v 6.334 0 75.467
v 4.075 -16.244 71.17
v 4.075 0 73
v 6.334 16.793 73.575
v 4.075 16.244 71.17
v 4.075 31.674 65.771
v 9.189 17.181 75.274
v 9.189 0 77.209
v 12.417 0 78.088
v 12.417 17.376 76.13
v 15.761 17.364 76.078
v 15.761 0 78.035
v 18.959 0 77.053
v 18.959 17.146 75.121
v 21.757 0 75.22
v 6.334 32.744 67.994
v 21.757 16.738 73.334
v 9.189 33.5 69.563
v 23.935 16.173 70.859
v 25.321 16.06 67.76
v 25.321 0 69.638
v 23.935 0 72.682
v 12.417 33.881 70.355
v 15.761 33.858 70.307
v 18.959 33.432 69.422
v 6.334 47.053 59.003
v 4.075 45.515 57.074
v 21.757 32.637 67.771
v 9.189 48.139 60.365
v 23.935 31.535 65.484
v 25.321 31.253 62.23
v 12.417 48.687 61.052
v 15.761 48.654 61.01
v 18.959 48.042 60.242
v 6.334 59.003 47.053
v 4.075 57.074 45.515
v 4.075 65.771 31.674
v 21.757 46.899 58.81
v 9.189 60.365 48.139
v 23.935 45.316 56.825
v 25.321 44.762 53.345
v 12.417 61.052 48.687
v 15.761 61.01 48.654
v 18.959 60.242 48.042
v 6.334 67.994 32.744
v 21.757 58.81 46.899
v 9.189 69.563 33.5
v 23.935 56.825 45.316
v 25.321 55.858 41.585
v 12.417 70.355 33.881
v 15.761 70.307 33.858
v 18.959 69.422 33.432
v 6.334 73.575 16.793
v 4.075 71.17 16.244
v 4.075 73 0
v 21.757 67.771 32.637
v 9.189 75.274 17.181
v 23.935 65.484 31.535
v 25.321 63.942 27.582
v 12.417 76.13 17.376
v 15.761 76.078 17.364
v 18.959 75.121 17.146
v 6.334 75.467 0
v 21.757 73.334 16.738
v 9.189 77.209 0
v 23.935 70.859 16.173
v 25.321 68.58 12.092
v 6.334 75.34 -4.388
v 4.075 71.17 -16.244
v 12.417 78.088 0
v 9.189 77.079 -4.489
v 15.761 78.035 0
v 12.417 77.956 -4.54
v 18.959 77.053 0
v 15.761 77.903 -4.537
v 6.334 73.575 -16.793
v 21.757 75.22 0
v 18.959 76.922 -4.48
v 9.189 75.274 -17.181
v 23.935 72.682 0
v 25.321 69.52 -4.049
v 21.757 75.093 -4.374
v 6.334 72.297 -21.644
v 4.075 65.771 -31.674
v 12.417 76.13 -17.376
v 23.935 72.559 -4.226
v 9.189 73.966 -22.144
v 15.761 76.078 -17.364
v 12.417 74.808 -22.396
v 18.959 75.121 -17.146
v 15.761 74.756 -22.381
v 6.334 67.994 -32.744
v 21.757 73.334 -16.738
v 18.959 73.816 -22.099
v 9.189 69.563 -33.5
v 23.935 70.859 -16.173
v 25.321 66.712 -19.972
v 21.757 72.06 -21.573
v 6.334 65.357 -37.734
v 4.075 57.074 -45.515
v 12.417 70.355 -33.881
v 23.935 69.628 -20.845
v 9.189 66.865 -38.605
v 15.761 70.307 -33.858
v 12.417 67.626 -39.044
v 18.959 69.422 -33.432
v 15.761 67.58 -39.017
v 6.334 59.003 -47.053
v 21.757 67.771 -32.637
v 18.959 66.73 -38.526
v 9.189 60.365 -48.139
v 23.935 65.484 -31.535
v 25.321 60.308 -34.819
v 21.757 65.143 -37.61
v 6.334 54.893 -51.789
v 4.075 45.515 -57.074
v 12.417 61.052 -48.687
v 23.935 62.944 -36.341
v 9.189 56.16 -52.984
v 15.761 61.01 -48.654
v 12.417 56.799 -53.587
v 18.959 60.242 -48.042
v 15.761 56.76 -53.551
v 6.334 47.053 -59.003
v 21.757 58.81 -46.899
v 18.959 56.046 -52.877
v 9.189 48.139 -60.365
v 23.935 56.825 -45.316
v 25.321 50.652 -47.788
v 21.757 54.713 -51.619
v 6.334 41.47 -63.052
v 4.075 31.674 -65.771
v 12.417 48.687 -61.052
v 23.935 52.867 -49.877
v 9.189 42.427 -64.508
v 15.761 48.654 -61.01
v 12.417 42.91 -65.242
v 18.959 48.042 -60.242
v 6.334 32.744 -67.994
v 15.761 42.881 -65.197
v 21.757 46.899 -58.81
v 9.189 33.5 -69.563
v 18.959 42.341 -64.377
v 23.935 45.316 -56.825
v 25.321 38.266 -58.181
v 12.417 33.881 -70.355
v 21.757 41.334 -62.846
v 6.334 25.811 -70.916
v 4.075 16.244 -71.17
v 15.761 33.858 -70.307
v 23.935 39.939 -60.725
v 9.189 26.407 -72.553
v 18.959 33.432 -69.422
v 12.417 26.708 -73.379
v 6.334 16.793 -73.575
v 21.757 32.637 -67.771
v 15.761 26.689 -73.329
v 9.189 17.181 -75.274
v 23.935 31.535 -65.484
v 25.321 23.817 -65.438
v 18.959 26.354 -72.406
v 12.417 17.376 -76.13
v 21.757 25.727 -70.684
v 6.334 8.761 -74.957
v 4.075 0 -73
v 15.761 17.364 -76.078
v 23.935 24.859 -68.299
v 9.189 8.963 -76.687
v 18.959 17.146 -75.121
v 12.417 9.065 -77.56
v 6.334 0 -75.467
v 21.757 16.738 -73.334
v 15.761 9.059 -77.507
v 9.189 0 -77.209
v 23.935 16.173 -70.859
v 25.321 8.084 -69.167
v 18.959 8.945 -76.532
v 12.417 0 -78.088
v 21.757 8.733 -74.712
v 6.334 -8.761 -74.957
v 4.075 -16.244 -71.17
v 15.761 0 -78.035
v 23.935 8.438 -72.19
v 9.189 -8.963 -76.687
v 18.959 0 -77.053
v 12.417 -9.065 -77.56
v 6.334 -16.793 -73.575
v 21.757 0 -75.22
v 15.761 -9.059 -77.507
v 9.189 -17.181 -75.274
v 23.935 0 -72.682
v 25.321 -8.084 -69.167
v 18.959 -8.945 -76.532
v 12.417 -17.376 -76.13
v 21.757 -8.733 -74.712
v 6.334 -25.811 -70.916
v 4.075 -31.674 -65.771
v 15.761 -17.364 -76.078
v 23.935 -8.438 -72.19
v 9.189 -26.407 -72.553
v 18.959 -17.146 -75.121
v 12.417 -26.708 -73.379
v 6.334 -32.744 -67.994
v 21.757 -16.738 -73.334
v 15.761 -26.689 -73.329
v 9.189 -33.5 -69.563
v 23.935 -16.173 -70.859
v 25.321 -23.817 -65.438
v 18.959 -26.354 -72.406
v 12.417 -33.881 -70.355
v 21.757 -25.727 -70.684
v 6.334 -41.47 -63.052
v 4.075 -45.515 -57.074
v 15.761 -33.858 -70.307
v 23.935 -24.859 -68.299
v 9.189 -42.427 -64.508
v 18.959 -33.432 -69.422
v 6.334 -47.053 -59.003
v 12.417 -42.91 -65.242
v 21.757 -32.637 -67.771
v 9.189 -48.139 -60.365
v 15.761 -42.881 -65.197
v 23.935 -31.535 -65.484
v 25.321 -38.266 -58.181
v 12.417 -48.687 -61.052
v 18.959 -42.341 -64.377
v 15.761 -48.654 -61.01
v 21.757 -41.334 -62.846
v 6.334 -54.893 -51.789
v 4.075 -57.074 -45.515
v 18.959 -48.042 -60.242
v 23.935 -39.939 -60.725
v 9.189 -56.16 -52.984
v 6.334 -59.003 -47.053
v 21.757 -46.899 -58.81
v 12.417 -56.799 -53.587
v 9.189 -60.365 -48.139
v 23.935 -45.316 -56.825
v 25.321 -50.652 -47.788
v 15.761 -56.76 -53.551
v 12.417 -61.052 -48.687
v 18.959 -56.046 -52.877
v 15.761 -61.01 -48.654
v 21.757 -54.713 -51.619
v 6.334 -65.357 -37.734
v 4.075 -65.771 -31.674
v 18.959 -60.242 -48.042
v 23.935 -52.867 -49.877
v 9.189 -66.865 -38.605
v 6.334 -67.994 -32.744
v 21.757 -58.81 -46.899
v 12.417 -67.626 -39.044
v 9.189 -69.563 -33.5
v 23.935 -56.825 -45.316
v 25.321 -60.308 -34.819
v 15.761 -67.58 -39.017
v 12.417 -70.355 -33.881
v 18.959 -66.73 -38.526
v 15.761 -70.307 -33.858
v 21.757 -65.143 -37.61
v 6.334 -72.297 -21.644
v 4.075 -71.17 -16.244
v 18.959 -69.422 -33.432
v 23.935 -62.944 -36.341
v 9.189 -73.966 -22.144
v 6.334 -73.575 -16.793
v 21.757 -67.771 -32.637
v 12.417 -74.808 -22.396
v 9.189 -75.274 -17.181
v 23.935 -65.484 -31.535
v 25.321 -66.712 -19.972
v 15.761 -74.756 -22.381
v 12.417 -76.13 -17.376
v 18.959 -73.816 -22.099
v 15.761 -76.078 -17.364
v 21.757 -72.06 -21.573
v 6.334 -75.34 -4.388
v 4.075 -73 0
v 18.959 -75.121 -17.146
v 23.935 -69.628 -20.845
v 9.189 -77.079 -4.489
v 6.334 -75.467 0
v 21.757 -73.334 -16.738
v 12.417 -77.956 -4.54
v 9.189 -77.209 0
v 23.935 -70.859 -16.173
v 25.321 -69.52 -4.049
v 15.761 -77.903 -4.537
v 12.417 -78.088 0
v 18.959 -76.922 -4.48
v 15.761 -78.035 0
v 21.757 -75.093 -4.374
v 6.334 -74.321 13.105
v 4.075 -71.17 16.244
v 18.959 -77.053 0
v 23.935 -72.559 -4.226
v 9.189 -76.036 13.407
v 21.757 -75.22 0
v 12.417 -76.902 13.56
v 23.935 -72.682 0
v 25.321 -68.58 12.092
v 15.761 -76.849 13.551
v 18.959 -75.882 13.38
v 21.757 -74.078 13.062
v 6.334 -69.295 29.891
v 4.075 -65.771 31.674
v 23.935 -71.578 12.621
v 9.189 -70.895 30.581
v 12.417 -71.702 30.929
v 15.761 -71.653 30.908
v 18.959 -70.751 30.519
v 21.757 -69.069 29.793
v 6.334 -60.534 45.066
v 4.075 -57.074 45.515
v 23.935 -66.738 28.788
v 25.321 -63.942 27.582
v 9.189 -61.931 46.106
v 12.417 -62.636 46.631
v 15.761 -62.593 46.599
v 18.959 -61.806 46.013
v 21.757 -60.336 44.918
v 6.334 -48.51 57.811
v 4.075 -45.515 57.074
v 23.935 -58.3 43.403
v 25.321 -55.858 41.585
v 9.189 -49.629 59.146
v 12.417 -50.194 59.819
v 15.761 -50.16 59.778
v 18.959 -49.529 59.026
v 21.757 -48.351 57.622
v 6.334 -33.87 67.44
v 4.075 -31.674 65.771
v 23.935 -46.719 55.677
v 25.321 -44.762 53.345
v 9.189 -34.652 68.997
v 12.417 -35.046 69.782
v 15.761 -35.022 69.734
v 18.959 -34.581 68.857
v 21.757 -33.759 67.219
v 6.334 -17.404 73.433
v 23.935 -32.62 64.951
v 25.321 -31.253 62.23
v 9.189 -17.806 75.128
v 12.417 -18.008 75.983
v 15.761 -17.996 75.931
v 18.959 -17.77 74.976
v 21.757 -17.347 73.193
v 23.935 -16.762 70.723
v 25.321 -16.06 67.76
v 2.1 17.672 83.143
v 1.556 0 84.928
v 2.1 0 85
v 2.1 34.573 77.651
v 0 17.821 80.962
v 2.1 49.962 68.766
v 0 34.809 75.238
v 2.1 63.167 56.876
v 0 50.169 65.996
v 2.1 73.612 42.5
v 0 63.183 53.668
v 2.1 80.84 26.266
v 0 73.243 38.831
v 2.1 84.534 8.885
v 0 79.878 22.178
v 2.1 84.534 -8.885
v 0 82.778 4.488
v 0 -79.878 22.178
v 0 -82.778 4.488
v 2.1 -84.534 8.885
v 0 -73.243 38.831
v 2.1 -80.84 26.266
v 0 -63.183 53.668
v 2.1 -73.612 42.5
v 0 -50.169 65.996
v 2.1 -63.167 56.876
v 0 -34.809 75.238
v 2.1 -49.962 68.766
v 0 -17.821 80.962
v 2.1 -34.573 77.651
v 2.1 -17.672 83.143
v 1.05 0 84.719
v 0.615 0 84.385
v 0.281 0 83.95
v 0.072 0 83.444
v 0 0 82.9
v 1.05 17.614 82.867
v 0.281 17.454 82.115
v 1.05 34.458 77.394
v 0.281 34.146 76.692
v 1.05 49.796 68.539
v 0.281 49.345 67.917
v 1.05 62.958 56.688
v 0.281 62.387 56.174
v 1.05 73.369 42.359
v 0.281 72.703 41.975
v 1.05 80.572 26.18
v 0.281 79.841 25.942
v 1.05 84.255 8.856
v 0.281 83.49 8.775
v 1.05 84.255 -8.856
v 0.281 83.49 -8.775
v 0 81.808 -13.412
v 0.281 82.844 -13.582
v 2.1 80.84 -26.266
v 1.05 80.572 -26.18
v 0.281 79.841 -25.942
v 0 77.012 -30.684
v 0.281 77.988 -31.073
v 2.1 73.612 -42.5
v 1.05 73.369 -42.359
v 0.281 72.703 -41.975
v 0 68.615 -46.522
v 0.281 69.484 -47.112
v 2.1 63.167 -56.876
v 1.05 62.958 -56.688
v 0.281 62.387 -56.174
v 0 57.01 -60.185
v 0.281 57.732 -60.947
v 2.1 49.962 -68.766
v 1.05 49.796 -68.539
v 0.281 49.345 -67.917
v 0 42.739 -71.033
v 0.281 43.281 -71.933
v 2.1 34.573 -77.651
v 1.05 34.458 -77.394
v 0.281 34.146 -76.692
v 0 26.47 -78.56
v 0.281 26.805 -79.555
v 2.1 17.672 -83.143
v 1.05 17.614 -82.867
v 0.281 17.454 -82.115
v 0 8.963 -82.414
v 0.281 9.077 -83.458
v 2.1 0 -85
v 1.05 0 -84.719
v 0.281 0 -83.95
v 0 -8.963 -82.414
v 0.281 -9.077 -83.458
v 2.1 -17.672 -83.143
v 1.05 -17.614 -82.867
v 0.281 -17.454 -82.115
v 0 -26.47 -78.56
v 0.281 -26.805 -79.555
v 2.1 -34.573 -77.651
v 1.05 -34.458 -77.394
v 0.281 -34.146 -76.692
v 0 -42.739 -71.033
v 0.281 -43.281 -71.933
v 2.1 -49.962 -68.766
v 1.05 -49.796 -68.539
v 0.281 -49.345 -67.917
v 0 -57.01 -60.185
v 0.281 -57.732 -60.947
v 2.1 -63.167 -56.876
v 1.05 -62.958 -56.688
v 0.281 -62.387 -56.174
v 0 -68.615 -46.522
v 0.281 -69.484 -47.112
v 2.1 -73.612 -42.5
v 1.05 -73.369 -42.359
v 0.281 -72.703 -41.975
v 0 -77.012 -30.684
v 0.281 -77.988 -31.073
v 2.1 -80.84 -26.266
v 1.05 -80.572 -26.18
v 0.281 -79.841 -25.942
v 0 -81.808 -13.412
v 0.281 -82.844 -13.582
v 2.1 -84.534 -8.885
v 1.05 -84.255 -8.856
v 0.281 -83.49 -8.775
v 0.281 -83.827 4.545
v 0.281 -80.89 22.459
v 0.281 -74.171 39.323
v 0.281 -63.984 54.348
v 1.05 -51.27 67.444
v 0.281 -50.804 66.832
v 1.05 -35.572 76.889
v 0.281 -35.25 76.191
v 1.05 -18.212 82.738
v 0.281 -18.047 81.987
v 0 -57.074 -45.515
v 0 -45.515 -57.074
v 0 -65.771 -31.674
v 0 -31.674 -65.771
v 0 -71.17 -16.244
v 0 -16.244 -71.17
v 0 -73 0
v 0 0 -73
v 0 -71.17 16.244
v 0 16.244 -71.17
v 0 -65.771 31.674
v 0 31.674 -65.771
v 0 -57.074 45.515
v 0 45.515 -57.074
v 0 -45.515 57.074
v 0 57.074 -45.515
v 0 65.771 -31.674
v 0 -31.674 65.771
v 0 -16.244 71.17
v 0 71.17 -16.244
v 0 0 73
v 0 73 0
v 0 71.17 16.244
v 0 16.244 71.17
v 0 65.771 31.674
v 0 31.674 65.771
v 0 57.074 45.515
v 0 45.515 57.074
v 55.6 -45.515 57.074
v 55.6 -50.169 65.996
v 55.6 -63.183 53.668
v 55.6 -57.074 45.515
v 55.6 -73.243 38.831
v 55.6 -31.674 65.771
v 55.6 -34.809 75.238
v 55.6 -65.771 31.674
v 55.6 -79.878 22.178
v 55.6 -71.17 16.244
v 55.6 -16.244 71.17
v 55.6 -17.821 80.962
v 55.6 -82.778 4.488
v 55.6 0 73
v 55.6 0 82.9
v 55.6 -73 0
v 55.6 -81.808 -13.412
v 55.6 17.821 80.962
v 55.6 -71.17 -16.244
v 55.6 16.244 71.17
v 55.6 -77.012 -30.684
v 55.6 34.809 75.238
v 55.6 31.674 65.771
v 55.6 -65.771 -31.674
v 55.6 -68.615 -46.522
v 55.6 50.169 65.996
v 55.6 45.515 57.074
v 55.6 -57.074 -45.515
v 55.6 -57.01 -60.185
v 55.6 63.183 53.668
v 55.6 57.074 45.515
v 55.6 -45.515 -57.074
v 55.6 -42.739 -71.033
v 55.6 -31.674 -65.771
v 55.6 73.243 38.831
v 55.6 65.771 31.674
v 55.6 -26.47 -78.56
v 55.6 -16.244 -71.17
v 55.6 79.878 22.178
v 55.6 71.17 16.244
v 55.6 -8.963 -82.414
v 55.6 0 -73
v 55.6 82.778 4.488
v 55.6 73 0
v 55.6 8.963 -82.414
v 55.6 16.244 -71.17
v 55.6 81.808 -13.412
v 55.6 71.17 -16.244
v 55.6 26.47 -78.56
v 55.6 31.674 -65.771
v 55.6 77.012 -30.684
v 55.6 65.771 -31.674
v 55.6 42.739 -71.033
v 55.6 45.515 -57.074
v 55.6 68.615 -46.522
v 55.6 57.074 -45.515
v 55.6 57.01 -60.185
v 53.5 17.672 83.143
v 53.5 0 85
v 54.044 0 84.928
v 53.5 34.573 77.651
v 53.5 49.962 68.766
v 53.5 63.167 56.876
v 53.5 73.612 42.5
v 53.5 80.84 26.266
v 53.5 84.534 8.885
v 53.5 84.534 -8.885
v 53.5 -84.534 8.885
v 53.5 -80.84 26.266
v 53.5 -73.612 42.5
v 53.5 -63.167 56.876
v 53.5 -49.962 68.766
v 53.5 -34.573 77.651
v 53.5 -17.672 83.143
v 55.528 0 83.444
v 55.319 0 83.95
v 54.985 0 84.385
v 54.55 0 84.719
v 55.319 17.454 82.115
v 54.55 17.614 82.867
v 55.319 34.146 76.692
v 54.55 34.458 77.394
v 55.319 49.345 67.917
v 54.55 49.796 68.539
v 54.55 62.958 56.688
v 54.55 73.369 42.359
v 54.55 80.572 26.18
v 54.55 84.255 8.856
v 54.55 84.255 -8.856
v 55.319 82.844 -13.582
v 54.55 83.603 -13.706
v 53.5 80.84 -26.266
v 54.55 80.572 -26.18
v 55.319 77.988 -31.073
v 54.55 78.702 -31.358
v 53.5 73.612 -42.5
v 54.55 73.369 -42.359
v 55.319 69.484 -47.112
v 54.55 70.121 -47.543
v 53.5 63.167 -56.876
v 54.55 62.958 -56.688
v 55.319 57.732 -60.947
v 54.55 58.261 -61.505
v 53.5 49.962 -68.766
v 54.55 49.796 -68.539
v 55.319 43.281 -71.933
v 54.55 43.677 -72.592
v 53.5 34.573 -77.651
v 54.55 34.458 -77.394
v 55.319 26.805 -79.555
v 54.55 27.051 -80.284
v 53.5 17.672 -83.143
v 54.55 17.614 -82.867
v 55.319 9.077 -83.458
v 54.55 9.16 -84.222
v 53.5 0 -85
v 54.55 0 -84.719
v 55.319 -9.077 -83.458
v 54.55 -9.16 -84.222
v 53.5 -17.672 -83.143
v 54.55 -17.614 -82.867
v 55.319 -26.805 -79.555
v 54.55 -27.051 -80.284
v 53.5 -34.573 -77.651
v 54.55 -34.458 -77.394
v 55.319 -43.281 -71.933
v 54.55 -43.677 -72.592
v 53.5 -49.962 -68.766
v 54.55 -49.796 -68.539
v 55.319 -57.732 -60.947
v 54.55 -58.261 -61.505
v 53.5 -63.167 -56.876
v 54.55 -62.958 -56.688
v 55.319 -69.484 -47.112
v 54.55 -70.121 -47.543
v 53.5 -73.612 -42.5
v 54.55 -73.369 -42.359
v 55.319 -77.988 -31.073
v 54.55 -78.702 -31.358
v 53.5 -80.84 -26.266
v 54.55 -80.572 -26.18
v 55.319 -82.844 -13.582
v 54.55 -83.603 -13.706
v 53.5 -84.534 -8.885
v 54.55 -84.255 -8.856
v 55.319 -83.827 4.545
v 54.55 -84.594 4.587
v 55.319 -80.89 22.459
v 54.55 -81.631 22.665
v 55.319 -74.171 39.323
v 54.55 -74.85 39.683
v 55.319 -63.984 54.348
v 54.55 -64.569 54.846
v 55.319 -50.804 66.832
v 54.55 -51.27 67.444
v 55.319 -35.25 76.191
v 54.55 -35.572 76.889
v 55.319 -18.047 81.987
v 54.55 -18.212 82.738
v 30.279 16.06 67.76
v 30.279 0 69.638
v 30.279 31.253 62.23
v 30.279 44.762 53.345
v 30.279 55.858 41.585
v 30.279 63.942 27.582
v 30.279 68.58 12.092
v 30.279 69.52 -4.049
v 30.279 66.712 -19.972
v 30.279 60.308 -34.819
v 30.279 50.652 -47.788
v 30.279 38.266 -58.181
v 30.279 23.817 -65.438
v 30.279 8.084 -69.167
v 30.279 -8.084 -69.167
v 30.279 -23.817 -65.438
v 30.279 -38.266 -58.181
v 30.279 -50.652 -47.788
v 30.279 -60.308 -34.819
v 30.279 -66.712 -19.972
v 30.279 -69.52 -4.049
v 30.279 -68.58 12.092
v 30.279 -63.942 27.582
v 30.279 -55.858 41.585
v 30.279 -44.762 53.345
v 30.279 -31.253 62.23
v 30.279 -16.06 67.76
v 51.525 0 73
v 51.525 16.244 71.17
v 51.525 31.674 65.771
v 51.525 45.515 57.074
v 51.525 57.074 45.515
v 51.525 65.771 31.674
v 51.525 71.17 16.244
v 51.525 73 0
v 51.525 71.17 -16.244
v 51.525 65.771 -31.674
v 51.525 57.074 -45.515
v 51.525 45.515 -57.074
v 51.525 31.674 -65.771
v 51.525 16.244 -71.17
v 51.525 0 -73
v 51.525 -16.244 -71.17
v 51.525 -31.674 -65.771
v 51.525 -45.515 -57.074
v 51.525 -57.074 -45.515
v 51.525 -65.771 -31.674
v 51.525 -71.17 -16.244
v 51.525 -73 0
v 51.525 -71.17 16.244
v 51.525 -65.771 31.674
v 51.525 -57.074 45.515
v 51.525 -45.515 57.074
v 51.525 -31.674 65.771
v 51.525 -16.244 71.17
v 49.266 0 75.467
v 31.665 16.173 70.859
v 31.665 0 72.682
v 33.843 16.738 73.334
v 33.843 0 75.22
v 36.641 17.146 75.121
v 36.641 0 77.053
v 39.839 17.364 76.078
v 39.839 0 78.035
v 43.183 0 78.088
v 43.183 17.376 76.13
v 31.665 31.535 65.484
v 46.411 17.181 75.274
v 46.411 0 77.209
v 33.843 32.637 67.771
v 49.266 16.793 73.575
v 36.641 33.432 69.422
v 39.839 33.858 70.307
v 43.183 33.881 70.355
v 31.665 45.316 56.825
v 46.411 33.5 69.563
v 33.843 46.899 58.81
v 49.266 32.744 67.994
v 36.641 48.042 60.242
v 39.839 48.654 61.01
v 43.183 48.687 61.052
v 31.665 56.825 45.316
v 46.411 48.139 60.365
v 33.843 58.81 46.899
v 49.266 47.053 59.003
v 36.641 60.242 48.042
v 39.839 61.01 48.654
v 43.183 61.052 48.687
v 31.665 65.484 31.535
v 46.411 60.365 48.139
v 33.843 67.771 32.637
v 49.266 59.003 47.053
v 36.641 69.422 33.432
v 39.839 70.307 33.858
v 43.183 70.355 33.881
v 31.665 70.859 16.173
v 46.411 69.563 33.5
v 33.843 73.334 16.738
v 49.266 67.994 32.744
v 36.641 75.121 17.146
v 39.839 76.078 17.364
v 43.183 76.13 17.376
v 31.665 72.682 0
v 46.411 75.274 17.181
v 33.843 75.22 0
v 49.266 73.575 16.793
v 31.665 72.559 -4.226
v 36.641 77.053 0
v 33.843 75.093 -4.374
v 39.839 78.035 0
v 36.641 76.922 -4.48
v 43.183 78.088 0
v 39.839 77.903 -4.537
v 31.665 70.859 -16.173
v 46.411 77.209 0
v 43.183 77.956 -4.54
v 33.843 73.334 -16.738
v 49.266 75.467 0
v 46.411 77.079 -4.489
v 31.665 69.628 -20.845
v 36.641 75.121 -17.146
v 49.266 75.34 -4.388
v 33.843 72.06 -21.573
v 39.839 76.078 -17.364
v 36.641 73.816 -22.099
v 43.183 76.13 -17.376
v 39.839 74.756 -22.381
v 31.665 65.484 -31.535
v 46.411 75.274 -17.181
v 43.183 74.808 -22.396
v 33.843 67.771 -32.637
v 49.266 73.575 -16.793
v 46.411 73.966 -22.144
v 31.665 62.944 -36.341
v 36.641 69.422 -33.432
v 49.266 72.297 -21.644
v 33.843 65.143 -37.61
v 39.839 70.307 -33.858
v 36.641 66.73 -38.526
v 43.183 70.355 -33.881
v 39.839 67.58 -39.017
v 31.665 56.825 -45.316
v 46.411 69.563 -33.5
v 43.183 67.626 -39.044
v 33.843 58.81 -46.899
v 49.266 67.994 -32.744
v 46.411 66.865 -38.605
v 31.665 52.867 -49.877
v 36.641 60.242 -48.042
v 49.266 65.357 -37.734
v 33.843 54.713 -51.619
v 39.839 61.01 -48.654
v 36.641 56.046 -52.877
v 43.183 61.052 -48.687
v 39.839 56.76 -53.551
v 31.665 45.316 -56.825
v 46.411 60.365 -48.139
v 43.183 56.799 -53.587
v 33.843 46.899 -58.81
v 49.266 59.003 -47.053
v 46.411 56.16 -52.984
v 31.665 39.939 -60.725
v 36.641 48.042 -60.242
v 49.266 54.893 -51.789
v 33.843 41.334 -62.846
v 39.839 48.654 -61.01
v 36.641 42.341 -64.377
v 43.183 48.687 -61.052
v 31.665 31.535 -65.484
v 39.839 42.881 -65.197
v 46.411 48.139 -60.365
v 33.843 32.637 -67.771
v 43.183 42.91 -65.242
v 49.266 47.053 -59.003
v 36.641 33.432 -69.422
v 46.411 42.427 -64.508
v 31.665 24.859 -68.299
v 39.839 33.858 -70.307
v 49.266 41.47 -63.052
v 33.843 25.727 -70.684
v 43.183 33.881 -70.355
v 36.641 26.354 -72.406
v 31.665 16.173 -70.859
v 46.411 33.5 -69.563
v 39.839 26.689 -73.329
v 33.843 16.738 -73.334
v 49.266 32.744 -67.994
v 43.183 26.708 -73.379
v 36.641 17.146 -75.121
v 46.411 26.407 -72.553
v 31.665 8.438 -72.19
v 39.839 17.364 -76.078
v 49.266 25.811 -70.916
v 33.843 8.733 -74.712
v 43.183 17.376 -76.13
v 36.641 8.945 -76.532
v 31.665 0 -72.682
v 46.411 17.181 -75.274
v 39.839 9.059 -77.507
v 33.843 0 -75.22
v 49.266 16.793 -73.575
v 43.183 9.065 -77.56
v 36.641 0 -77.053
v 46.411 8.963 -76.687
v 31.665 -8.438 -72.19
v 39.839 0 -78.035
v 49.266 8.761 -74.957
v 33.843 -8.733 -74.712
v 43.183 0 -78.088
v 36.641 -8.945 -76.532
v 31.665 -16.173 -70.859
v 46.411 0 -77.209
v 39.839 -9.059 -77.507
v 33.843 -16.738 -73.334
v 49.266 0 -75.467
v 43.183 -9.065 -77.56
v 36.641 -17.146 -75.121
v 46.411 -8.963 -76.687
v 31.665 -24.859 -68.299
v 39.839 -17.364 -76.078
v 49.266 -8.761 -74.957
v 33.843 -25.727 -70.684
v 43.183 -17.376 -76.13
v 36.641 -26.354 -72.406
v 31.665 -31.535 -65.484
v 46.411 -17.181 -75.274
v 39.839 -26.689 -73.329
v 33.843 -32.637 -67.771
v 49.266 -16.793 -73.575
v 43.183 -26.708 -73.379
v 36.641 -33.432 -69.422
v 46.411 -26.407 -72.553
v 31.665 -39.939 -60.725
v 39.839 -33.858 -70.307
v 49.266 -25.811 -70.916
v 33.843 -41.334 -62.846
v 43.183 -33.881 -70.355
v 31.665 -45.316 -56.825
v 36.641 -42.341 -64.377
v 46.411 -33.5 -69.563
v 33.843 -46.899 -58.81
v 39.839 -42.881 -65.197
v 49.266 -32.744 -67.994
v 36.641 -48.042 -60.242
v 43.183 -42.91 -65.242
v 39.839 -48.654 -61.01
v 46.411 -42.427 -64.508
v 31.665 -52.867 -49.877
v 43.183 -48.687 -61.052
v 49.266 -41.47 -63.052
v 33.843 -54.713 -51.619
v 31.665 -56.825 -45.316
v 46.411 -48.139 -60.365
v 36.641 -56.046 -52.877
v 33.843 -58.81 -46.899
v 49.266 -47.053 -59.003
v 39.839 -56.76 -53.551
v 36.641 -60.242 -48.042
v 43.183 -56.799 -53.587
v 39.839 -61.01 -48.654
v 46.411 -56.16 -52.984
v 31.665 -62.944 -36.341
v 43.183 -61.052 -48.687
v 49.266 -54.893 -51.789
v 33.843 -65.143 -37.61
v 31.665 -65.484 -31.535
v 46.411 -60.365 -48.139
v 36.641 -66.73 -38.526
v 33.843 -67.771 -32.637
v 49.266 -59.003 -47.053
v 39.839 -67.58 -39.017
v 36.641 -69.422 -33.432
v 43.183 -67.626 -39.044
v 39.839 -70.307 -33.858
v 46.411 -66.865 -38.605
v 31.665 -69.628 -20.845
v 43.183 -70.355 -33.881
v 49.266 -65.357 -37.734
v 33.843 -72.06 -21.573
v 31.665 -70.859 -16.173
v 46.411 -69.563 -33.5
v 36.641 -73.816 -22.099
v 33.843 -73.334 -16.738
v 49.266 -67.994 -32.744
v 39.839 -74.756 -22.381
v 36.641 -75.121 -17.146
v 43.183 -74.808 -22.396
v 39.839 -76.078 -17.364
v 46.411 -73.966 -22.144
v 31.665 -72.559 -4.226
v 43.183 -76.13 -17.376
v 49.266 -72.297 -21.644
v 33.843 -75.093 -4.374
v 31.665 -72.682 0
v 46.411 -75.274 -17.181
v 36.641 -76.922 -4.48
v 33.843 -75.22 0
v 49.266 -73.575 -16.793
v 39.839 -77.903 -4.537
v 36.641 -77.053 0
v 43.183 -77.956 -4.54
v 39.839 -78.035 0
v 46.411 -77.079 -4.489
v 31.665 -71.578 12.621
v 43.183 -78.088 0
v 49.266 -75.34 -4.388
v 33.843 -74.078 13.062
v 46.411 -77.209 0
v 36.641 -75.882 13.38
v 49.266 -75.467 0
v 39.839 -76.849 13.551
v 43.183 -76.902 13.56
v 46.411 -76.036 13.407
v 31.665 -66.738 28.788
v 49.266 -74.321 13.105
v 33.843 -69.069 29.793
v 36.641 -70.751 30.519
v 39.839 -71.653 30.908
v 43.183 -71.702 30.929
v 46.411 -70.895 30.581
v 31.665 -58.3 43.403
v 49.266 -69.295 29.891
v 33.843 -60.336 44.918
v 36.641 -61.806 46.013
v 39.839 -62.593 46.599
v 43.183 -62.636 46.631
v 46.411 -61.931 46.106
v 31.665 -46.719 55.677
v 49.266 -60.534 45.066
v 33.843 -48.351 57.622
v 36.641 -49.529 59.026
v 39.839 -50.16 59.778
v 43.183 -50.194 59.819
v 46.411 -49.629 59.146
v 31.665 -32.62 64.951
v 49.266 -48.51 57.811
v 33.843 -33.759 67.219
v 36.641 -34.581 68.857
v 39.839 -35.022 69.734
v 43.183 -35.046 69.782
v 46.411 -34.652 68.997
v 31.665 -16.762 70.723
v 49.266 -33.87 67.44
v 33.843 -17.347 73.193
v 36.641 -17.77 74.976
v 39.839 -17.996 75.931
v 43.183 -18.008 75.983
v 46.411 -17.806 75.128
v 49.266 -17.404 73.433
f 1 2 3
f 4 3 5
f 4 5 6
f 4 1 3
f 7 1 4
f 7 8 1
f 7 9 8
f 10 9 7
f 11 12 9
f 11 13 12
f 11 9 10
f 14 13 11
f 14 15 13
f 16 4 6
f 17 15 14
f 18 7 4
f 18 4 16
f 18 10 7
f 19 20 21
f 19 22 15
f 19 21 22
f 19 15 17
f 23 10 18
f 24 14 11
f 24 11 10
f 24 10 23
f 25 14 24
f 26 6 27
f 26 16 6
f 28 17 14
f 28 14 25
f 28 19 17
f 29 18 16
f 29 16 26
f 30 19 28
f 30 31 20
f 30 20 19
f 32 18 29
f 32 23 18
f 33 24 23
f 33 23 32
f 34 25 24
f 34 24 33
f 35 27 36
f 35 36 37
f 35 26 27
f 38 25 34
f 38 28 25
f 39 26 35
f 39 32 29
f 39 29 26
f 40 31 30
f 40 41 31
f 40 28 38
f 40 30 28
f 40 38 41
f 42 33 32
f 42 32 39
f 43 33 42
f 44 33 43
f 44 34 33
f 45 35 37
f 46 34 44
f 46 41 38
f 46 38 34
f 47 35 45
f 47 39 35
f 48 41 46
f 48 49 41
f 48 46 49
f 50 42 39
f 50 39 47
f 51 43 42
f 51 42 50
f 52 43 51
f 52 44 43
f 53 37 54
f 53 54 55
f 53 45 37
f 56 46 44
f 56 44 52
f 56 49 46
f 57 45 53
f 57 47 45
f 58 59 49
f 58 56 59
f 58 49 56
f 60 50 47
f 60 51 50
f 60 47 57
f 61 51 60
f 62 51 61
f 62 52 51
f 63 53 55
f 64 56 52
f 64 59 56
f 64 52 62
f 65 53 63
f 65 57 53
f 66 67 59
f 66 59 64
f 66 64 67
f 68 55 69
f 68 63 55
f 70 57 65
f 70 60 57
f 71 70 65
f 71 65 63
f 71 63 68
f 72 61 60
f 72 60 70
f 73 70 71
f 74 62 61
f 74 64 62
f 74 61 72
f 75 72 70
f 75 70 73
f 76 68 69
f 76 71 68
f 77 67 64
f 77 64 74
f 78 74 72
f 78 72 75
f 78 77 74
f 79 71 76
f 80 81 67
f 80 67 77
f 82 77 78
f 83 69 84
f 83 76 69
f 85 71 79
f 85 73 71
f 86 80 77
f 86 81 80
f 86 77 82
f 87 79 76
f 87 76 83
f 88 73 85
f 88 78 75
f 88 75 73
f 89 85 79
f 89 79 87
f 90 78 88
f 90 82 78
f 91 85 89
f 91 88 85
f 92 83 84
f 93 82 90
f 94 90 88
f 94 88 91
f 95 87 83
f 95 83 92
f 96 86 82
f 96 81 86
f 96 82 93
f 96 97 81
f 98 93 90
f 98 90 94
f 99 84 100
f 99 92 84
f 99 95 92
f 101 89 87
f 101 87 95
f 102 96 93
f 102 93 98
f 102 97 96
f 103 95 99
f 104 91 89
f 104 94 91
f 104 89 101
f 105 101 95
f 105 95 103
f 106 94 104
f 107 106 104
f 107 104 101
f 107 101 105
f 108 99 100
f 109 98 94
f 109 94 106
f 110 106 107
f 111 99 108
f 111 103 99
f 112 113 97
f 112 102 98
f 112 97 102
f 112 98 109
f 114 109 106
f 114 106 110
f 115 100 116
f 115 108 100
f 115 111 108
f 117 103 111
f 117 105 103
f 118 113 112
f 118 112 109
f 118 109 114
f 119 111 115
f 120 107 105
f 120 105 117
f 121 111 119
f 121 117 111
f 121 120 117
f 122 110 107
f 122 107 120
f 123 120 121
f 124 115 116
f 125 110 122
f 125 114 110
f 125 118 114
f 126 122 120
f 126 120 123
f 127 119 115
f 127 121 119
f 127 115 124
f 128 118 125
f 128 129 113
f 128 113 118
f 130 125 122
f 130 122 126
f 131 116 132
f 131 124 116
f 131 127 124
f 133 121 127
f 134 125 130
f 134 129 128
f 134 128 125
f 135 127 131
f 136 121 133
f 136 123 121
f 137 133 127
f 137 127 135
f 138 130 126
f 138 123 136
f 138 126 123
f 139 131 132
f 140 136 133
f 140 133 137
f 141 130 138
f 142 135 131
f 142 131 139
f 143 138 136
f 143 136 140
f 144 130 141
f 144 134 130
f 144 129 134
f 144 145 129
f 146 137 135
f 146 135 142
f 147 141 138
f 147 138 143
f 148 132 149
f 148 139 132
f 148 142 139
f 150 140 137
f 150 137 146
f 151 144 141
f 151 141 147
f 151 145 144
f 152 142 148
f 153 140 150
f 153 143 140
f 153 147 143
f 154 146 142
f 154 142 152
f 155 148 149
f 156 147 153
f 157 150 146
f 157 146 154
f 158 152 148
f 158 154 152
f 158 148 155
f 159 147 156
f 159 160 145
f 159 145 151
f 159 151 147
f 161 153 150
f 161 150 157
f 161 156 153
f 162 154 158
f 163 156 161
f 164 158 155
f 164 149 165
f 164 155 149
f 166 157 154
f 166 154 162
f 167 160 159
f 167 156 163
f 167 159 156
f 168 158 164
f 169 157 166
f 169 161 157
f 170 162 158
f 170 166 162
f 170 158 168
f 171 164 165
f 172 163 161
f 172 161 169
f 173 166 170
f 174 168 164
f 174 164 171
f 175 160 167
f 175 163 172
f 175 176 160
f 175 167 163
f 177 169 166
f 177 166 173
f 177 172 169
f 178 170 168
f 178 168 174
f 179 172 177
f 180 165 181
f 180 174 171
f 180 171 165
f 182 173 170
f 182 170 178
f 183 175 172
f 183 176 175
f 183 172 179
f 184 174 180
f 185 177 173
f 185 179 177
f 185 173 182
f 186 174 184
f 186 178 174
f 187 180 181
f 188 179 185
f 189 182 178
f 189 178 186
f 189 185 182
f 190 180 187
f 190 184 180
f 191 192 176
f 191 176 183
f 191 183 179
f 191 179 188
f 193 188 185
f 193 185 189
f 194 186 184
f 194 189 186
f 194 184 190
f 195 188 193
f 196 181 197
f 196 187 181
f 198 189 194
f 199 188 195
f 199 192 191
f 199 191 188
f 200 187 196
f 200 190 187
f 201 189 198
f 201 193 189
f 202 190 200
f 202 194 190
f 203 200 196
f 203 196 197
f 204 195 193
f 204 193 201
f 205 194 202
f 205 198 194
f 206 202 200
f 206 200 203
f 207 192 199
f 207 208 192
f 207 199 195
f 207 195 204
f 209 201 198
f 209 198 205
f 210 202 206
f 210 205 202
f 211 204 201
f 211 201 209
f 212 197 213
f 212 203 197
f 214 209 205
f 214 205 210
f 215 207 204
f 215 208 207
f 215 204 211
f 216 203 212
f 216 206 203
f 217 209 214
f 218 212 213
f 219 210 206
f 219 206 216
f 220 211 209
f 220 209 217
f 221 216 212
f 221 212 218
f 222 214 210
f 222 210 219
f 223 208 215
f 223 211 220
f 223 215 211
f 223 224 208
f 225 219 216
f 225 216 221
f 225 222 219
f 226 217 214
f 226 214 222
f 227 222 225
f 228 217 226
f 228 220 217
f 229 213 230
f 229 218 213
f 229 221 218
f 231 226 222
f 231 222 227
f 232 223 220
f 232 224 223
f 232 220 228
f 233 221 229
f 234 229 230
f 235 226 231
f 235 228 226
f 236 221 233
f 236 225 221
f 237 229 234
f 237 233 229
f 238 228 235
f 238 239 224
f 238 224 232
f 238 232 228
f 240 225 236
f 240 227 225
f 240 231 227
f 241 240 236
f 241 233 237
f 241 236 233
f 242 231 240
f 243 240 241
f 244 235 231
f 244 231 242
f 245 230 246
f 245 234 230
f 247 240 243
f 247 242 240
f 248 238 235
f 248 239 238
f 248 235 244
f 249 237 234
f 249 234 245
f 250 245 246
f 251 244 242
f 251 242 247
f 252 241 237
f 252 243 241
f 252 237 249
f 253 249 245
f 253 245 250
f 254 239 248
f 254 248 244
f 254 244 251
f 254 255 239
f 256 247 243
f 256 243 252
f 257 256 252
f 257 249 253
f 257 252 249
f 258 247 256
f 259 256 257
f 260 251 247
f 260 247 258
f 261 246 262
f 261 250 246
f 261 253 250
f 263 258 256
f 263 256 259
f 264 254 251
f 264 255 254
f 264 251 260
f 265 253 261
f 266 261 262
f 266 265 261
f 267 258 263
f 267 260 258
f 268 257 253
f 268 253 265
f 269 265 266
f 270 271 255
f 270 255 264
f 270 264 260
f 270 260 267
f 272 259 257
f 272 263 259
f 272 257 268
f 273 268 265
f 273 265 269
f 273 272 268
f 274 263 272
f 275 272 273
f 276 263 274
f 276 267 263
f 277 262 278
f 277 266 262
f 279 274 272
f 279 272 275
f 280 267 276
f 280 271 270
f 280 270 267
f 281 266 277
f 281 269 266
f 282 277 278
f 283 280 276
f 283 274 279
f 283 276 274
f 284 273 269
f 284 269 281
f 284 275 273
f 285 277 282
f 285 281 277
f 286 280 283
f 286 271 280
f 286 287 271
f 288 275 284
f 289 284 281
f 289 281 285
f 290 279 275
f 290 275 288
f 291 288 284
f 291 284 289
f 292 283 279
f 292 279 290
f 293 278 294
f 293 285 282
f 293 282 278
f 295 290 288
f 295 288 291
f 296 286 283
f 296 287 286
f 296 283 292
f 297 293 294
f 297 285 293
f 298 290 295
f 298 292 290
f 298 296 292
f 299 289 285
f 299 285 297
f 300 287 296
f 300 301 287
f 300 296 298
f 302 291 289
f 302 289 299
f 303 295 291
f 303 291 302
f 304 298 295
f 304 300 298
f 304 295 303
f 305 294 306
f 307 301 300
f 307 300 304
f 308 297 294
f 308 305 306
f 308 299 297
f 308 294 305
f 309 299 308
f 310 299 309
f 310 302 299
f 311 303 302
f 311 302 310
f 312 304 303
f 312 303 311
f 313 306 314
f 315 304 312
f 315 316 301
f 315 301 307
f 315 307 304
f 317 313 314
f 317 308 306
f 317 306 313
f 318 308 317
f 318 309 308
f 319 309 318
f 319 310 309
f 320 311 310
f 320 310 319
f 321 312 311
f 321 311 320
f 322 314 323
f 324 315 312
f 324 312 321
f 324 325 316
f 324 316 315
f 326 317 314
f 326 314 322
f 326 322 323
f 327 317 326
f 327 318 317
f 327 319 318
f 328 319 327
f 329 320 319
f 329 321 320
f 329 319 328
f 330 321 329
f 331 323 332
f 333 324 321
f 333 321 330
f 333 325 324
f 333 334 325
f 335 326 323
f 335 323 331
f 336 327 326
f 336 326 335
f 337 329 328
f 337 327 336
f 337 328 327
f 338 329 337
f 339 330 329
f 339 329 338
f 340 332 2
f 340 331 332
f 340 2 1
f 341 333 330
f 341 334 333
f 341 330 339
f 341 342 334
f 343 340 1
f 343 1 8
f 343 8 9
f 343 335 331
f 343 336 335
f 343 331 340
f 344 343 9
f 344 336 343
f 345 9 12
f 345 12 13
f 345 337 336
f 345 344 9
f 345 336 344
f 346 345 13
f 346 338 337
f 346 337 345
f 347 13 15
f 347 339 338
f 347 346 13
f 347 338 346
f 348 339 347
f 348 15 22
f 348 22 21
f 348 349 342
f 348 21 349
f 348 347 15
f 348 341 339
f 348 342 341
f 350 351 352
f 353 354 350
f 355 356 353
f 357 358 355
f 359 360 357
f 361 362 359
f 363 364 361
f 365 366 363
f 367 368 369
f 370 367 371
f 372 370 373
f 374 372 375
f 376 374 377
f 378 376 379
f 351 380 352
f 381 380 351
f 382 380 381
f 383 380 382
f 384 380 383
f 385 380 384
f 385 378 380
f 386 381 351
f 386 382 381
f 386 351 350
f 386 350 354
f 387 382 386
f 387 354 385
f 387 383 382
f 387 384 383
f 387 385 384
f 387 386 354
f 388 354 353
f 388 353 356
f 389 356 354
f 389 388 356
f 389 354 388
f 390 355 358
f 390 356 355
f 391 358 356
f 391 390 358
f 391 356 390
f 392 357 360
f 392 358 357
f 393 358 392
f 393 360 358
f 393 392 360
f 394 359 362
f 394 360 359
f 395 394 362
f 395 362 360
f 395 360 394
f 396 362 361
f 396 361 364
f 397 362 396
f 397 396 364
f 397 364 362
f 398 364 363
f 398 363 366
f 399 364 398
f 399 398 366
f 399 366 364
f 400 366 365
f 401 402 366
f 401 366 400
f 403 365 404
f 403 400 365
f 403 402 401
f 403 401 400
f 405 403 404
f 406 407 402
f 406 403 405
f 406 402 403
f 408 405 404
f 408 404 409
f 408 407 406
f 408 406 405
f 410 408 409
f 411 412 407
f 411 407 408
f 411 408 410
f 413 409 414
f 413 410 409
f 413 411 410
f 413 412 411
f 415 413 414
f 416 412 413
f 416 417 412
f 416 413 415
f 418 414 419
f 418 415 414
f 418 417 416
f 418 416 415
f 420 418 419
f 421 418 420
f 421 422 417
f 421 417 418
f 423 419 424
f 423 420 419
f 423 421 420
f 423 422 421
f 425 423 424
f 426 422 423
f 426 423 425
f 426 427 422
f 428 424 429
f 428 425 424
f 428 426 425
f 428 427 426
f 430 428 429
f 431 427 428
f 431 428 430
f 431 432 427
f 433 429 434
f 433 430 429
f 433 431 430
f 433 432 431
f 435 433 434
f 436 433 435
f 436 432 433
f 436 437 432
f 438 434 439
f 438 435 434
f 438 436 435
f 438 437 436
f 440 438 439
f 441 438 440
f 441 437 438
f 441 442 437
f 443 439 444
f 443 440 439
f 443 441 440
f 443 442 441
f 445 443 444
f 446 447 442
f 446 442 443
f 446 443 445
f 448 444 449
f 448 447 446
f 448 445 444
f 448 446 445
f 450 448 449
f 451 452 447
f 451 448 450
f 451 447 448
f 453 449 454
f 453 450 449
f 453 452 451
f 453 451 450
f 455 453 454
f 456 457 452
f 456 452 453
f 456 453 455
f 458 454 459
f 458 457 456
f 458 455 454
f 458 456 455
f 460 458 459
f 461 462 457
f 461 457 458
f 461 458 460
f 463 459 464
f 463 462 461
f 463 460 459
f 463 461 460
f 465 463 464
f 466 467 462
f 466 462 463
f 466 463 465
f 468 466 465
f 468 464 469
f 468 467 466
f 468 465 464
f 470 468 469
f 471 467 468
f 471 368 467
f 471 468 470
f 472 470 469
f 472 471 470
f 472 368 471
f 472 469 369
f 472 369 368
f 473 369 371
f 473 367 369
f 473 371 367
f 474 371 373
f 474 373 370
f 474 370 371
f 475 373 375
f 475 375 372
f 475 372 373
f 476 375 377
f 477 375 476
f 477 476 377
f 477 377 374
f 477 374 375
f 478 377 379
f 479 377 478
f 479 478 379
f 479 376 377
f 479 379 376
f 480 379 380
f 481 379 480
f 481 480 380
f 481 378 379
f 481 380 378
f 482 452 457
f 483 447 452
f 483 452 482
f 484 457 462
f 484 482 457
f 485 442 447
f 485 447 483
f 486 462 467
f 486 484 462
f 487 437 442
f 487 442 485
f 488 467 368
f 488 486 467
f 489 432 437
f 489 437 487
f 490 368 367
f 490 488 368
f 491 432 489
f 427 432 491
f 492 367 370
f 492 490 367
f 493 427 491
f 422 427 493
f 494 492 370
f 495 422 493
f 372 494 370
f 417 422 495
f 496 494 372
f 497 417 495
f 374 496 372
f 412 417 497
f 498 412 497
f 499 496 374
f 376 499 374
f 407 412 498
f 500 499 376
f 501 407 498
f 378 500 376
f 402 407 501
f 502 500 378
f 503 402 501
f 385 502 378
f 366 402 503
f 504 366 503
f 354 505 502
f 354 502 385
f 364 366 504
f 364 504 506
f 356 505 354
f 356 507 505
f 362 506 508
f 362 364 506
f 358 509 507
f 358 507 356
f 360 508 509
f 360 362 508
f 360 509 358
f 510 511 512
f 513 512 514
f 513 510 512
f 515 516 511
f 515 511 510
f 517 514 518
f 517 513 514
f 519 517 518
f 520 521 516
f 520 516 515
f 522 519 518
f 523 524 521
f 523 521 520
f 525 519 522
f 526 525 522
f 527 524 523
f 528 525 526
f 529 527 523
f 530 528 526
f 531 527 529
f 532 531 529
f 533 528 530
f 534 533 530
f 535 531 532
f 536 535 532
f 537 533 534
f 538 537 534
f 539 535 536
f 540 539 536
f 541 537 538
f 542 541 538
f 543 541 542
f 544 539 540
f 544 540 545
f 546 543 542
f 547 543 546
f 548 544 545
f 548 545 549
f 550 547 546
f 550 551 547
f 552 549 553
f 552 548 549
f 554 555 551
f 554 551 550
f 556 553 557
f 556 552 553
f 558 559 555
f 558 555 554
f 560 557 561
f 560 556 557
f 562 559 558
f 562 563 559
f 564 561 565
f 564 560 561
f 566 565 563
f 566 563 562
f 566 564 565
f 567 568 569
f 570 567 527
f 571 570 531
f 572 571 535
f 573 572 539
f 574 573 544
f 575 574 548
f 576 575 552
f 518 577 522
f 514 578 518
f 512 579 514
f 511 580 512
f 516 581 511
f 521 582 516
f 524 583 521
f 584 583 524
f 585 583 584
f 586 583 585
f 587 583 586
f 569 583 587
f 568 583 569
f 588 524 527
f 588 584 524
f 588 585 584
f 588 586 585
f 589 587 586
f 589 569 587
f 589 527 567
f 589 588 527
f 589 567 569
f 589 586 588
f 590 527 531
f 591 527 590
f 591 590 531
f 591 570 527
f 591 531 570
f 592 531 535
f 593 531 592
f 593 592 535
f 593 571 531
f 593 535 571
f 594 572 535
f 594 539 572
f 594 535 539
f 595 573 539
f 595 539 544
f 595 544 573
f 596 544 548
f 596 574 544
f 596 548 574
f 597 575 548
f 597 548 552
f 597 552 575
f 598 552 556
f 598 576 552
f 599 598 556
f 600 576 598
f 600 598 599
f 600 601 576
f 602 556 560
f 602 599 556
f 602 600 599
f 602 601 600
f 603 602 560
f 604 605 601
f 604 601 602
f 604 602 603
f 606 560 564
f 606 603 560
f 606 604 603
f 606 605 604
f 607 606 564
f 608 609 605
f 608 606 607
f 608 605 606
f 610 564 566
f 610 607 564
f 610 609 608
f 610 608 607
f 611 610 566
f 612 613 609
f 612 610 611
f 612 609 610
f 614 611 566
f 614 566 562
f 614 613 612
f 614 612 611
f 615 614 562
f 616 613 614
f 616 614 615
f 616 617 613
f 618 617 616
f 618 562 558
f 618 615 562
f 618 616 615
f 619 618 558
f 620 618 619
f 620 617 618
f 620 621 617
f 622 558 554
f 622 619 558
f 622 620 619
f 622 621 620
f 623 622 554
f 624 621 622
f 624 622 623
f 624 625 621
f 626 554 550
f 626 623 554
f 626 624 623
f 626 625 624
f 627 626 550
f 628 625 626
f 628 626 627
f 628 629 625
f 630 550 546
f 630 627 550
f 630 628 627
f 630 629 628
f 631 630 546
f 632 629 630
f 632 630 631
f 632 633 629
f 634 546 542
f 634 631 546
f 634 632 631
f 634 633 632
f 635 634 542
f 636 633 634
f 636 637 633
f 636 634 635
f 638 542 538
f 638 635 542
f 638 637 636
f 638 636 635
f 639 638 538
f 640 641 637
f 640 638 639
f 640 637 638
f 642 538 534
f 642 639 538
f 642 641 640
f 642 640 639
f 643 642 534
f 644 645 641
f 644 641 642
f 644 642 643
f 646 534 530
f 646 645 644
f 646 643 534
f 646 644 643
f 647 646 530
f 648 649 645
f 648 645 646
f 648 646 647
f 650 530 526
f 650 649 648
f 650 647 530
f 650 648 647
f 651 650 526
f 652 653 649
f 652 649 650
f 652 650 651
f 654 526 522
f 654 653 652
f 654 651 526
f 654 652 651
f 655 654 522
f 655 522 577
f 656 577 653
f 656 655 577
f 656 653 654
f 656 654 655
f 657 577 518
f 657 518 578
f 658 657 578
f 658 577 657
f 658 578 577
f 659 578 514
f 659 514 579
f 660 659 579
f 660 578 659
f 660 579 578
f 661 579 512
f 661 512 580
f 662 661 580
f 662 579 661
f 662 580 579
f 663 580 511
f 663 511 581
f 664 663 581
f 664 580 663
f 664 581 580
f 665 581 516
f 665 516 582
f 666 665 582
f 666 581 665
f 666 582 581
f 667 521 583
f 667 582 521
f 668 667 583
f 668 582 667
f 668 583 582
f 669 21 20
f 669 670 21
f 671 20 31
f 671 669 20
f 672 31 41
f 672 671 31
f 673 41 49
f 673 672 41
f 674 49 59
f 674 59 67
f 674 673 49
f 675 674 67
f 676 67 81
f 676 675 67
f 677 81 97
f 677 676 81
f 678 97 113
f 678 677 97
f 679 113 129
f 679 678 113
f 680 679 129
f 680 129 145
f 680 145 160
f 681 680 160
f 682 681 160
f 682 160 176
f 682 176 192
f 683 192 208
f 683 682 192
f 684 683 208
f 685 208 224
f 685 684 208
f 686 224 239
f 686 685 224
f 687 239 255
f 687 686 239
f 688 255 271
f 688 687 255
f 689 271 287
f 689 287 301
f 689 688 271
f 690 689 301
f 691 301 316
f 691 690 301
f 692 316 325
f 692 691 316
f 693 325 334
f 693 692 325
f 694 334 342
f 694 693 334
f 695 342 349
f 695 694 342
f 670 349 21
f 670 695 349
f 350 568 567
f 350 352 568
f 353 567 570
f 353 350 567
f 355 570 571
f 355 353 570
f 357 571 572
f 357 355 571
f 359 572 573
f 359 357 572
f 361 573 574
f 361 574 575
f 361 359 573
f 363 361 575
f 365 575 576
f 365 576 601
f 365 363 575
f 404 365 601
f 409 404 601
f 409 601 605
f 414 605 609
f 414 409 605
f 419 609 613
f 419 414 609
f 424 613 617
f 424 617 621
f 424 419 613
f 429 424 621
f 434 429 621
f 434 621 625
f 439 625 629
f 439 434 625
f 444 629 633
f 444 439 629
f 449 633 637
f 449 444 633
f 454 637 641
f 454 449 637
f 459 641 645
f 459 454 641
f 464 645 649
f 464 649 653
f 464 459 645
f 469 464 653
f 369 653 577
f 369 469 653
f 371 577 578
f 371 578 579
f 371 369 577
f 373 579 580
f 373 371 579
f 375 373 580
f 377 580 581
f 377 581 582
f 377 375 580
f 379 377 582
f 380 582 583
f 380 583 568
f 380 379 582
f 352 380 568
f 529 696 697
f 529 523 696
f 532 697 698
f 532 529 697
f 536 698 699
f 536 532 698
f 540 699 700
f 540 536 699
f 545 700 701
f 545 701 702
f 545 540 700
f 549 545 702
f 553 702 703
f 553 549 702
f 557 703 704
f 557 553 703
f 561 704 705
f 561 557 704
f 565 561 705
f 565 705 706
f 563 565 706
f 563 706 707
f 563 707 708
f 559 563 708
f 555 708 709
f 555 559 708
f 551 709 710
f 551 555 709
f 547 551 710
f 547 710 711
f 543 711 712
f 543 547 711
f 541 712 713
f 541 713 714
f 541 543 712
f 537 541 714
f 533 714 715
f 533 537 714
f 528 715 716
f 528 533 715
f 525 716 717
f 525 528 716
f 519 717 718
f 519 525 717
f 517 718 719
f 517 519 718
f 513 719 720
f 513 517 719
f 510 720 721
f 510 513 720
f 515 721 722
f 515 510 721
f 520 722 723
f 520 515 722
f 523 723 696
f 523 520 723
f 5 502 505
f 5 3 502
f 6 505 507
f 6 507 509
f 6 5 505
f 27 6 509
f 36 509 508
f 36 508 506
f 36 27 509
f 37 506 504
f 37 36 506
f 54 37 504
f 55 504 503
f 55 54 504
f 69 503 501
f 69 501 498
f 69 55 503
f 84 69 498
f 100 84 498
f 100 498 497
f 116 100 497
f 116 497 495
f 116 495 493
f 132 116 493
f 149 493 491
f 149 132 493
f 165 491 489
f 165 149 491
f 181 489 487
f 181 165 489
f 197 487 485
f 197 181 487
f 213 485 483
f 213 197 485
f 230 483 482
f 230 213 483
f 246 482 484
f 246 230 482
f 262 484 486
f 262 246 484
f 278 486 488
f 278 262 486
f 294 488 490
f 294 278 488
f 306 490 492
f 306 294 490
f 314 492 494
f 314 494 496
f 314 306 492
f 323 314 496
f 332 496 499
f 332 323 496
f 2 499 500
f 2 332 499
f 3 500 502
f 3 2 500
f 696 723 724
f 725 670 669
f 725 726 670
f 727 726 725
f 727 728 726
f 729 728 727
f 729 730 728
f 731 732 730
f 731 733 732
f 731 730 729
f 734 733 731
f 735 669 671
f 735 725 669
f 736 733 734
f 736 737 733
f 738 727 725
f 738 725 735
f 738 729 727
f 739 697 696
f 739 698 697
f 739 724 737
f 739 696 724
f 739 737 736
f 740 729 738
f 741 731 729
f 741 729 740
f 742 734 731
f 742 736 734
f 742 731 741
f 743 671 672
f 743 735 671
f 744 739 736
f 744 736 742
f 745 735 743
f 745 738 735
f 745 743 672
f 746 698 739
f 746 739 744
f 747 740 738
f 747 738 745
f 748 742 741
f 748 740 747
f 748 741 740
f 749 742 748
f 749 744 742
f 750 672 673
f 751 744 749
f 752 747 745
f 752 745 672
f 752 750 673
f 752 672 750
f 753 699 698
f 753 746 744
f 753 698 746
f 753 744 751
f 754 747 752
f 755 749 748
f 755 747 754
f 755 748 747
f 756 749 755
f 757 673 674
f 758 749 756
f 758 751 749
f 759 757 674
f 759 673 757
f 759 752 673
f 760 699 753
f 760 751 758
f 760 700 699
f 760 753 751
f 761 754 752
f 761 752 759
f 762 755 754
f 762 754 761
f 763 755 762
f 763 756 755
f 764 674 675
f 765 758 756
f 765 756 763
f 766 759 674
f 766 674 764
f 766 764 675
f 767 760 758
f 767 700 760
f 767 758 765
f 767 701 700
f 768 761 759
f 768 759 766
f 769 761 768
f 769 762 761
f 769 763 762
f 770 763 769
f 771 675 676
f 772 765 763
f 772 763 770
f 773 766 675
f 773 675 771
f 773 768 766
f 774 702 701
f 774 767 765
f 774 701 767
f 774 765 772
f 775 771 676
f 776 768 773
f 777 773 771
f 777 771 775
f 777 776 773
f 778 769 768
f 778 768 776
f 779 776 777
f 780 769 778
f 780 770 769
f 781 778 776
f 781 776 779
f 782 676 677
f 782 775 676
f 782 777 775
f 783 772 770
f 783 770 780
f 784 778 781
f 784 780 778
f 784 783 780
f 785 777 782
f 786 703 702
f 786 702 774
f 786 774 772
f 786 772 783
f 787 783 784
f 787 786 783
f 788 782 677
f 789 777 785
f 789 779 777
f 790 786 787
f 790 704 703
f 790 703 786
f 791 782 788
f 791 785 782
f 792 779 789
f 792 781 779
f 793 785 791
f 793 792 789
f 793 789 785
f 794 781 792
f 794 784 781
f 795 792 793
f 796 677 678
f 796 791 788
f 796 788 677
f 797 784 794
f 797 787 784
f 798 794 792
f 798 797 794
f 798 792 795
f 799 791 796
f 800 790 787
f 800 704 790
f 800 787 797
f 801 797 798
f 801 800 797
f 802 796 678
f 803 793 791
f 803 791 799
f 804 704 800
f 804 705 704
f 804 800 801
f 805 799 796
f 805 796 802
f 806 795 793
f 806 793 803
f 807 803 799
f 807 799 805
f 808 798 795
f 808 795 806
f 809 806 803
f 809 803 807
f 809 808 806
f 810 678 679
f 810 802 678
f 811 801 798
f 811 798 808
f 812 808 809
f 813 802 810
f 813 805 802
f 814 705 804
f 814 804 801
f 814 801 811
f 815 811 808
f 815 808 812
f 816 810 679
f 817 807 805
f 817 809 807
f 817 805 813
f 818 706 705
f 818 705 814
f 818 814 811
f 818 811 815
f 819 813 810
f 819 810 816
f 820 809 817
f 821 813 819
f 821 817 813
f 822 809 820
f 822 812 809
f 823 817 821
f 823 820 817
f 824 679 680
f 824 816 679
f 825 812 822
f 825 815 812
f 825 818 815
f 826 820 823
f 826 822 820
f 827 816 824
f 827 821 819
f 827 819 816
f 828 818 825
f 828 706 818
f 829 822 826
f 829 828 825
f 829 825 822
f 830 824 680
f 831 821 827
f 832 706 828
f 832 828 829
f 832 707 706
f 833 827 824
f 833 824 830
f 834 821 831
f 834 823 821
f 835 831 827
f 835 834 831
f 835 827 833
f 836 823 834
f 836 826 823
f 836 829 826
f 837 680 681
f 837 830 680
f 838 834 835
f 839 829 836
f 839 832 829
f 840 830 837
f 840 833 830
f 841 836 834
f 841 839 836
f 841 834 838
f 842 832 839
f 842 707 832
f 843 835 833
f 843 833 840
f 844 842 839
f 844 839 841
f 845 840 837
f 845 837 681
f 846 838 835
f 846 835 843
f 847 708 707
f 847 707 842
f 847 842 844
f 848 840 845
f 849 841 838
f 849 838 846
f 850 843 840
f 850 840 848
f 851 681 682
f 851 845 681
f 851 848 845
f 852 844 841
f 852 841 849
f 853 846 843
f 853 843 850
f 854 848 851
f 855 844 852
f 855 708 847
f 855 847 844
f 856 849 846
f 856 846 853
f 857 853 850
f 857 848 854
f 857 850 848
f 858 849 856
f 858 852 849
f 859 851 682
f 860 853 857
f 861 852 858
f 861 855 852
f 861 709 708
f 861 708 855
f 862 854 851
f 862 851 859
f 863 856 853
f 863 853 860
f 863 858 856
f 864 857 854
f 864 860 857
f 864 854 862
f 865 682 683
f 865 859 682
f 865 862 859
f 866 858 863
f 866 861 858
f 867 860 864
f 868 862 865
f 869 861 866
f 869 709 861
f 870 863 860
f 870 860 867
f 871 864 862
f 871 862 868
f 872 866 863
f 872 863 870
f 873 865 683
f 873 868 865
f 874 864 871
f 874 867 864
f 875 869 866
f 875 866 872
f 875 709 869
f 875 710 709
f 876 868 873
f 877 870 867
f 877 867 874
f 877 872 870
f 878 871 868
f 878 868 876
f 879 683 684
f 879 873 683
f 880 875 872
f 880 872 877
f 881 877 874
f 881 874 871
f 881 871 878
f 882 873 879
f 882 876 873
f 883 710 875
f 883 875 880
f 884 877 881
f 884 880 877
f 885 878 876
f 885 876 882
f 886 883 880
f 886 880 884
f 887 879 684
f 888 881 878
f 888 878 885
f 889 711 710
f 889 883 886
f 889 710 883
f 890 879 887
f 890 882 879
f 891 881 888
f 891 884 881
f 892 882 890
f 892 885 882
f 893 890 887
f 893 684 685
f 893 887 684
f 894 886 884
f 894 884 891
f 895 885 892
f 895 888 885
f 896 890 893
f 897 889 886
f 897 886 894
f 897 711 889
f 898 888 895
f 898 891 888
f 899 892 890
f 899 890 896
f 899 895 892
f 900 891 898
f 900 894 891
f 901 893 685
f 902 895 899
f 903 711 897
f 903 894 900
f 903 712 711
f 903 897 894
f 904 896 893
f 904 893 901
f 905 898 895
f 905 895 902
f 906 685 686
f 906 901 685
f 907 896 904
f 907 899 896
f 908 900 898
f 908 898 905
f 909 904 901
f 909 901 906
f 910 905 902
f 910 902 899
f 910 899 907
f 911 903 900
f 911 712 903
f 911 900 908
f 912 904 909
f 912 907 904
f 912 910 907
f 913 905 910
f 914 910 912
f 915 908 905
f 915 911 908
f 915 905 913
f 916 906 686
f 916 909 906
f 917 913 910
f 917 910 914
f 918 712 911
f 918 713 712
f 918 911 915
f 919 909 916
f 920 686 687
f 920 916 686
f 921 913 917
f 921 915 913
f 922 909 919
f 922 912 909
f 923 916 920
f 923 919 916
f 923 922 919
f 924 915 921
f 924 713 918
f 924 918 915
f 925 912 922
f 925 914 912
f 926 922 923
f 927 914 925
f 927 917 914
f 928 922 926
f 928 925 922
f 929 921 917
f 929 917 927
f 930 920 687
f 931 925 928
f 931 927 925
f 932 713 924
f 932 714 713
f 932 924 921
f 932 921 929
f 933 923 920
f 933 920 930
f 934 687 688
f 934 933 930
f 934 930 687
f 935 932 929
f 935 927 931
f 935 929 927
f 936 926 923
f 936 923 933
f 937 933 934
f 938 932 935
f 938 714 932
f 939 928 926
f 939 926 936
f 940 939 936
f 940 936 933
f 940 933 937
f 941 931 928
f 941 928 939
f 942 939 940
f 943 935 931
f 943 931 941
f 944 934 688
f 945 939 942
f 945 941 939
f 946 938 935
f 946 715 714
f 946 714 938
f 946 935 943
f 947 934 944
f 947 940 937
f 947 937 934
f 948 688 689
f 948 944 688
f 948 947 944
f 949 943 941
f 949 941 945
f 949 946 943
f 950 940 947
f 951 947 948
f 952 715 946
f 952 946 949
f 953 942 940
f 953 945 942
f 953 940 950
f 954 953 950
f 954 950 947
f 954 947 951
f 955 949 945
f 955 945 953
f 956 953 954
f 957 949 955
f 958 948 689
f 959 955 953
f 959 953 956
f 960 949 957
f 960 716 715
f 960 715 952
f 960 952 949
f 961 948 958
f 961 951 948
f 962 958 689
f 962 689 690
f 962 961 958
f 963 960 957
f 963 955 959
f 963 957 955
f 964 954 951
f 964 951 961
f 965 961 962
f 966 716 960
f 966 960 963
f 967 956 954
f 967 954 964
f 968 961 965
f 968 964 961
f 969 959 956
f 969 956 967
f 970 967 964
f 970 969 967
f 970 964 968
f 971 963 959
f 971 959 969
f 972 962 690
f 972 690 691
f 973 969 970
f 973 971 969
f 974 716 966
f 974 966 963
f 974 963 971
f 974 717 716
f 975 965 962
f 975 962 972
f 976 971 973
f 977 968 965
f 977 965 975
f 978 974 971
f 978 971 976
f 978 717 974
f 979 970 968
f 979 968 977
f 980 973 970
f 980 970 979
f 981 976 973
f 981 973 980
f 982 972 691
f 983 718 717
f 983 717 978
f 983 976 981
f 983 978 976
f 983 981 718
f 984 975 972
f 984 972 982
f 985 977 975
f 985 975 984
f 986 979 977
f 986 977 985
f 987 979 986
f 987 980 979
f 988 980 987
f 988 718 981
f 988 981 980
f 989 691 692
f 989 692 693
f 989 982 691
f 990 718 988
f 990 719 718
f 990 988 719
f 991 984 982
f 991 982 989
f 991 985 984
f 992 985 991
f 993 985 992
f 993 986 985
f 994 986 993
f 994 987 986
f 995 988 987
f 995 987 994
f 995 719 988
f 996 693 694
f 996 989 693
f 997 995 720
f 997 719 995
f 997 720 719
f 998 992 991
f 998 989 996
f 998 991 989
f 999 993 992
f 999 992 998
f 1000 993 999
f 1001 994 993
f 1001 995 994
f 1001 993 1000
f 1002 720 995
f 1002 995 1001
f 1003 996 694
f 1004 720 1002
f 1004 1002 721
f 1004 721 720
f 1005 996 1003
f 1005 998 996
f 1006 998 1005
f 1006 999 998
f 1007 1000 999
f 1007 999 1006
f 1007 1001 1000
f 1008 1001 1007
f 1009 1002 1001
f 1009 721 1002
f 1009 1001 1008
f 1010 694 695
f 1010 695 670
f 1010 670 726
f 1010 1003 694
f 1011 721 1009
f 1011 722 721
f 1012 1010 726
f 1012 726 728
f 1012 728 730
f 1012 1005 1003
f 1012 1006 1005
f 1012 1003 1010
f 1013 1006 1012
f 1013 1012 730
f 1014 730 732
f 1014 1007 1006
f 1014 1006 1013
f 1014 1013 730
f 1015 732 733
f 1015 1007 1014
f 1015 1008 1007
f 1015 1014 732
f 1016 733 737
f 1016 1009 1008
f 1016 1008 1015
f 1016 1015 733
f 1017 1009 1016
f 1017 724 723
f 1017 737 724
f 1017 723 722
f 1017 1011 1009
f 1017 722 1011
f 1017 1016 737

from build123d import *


with BuildPart() as part:
    # Schizzo1 → Rivoluzione1 (revolve)
    with BuildSketch(Plane.XY, mode=Mode.PRIVATE) as rivoluzione1_sk:
        with BuildLine():
            Line((0, 82.9), (0, 73))
            Line((0, 73), (4.075173742, 73))
            ThreePointArc((4.075173742, 73), (15.761127456, 78.034636074), (25.321314712, 69.6375))
            Line((25.321314712, 69.6375), (30.278685288, 69.6375))
            ThreePointArc((30.278685288, 69.6375), (39.838872544, 78.034636074), (51.524826258, 73))
            Line((51.524826258, 73), (55.6, 73))
            Line((55.6, 73), (55.6, 82.9))
            ThreePointArc((55.6, 82.9), (54.98492424, 84.38492424), (53.5, 85))
            Line((53.5, 85), (2.1, 85))
            ThreePointArc((2.1, 85), (0.61507576, 84.38492424), (0, 82.9))
        make_face()
    revolve(rivoluzione1_sk.sketch.rotate(Axis((27.8, 0, 0), (-1, 0, 0)), 270), axis=Axis((27.8, 0, 0), (-1, 0, 0)))


solid = part.part
